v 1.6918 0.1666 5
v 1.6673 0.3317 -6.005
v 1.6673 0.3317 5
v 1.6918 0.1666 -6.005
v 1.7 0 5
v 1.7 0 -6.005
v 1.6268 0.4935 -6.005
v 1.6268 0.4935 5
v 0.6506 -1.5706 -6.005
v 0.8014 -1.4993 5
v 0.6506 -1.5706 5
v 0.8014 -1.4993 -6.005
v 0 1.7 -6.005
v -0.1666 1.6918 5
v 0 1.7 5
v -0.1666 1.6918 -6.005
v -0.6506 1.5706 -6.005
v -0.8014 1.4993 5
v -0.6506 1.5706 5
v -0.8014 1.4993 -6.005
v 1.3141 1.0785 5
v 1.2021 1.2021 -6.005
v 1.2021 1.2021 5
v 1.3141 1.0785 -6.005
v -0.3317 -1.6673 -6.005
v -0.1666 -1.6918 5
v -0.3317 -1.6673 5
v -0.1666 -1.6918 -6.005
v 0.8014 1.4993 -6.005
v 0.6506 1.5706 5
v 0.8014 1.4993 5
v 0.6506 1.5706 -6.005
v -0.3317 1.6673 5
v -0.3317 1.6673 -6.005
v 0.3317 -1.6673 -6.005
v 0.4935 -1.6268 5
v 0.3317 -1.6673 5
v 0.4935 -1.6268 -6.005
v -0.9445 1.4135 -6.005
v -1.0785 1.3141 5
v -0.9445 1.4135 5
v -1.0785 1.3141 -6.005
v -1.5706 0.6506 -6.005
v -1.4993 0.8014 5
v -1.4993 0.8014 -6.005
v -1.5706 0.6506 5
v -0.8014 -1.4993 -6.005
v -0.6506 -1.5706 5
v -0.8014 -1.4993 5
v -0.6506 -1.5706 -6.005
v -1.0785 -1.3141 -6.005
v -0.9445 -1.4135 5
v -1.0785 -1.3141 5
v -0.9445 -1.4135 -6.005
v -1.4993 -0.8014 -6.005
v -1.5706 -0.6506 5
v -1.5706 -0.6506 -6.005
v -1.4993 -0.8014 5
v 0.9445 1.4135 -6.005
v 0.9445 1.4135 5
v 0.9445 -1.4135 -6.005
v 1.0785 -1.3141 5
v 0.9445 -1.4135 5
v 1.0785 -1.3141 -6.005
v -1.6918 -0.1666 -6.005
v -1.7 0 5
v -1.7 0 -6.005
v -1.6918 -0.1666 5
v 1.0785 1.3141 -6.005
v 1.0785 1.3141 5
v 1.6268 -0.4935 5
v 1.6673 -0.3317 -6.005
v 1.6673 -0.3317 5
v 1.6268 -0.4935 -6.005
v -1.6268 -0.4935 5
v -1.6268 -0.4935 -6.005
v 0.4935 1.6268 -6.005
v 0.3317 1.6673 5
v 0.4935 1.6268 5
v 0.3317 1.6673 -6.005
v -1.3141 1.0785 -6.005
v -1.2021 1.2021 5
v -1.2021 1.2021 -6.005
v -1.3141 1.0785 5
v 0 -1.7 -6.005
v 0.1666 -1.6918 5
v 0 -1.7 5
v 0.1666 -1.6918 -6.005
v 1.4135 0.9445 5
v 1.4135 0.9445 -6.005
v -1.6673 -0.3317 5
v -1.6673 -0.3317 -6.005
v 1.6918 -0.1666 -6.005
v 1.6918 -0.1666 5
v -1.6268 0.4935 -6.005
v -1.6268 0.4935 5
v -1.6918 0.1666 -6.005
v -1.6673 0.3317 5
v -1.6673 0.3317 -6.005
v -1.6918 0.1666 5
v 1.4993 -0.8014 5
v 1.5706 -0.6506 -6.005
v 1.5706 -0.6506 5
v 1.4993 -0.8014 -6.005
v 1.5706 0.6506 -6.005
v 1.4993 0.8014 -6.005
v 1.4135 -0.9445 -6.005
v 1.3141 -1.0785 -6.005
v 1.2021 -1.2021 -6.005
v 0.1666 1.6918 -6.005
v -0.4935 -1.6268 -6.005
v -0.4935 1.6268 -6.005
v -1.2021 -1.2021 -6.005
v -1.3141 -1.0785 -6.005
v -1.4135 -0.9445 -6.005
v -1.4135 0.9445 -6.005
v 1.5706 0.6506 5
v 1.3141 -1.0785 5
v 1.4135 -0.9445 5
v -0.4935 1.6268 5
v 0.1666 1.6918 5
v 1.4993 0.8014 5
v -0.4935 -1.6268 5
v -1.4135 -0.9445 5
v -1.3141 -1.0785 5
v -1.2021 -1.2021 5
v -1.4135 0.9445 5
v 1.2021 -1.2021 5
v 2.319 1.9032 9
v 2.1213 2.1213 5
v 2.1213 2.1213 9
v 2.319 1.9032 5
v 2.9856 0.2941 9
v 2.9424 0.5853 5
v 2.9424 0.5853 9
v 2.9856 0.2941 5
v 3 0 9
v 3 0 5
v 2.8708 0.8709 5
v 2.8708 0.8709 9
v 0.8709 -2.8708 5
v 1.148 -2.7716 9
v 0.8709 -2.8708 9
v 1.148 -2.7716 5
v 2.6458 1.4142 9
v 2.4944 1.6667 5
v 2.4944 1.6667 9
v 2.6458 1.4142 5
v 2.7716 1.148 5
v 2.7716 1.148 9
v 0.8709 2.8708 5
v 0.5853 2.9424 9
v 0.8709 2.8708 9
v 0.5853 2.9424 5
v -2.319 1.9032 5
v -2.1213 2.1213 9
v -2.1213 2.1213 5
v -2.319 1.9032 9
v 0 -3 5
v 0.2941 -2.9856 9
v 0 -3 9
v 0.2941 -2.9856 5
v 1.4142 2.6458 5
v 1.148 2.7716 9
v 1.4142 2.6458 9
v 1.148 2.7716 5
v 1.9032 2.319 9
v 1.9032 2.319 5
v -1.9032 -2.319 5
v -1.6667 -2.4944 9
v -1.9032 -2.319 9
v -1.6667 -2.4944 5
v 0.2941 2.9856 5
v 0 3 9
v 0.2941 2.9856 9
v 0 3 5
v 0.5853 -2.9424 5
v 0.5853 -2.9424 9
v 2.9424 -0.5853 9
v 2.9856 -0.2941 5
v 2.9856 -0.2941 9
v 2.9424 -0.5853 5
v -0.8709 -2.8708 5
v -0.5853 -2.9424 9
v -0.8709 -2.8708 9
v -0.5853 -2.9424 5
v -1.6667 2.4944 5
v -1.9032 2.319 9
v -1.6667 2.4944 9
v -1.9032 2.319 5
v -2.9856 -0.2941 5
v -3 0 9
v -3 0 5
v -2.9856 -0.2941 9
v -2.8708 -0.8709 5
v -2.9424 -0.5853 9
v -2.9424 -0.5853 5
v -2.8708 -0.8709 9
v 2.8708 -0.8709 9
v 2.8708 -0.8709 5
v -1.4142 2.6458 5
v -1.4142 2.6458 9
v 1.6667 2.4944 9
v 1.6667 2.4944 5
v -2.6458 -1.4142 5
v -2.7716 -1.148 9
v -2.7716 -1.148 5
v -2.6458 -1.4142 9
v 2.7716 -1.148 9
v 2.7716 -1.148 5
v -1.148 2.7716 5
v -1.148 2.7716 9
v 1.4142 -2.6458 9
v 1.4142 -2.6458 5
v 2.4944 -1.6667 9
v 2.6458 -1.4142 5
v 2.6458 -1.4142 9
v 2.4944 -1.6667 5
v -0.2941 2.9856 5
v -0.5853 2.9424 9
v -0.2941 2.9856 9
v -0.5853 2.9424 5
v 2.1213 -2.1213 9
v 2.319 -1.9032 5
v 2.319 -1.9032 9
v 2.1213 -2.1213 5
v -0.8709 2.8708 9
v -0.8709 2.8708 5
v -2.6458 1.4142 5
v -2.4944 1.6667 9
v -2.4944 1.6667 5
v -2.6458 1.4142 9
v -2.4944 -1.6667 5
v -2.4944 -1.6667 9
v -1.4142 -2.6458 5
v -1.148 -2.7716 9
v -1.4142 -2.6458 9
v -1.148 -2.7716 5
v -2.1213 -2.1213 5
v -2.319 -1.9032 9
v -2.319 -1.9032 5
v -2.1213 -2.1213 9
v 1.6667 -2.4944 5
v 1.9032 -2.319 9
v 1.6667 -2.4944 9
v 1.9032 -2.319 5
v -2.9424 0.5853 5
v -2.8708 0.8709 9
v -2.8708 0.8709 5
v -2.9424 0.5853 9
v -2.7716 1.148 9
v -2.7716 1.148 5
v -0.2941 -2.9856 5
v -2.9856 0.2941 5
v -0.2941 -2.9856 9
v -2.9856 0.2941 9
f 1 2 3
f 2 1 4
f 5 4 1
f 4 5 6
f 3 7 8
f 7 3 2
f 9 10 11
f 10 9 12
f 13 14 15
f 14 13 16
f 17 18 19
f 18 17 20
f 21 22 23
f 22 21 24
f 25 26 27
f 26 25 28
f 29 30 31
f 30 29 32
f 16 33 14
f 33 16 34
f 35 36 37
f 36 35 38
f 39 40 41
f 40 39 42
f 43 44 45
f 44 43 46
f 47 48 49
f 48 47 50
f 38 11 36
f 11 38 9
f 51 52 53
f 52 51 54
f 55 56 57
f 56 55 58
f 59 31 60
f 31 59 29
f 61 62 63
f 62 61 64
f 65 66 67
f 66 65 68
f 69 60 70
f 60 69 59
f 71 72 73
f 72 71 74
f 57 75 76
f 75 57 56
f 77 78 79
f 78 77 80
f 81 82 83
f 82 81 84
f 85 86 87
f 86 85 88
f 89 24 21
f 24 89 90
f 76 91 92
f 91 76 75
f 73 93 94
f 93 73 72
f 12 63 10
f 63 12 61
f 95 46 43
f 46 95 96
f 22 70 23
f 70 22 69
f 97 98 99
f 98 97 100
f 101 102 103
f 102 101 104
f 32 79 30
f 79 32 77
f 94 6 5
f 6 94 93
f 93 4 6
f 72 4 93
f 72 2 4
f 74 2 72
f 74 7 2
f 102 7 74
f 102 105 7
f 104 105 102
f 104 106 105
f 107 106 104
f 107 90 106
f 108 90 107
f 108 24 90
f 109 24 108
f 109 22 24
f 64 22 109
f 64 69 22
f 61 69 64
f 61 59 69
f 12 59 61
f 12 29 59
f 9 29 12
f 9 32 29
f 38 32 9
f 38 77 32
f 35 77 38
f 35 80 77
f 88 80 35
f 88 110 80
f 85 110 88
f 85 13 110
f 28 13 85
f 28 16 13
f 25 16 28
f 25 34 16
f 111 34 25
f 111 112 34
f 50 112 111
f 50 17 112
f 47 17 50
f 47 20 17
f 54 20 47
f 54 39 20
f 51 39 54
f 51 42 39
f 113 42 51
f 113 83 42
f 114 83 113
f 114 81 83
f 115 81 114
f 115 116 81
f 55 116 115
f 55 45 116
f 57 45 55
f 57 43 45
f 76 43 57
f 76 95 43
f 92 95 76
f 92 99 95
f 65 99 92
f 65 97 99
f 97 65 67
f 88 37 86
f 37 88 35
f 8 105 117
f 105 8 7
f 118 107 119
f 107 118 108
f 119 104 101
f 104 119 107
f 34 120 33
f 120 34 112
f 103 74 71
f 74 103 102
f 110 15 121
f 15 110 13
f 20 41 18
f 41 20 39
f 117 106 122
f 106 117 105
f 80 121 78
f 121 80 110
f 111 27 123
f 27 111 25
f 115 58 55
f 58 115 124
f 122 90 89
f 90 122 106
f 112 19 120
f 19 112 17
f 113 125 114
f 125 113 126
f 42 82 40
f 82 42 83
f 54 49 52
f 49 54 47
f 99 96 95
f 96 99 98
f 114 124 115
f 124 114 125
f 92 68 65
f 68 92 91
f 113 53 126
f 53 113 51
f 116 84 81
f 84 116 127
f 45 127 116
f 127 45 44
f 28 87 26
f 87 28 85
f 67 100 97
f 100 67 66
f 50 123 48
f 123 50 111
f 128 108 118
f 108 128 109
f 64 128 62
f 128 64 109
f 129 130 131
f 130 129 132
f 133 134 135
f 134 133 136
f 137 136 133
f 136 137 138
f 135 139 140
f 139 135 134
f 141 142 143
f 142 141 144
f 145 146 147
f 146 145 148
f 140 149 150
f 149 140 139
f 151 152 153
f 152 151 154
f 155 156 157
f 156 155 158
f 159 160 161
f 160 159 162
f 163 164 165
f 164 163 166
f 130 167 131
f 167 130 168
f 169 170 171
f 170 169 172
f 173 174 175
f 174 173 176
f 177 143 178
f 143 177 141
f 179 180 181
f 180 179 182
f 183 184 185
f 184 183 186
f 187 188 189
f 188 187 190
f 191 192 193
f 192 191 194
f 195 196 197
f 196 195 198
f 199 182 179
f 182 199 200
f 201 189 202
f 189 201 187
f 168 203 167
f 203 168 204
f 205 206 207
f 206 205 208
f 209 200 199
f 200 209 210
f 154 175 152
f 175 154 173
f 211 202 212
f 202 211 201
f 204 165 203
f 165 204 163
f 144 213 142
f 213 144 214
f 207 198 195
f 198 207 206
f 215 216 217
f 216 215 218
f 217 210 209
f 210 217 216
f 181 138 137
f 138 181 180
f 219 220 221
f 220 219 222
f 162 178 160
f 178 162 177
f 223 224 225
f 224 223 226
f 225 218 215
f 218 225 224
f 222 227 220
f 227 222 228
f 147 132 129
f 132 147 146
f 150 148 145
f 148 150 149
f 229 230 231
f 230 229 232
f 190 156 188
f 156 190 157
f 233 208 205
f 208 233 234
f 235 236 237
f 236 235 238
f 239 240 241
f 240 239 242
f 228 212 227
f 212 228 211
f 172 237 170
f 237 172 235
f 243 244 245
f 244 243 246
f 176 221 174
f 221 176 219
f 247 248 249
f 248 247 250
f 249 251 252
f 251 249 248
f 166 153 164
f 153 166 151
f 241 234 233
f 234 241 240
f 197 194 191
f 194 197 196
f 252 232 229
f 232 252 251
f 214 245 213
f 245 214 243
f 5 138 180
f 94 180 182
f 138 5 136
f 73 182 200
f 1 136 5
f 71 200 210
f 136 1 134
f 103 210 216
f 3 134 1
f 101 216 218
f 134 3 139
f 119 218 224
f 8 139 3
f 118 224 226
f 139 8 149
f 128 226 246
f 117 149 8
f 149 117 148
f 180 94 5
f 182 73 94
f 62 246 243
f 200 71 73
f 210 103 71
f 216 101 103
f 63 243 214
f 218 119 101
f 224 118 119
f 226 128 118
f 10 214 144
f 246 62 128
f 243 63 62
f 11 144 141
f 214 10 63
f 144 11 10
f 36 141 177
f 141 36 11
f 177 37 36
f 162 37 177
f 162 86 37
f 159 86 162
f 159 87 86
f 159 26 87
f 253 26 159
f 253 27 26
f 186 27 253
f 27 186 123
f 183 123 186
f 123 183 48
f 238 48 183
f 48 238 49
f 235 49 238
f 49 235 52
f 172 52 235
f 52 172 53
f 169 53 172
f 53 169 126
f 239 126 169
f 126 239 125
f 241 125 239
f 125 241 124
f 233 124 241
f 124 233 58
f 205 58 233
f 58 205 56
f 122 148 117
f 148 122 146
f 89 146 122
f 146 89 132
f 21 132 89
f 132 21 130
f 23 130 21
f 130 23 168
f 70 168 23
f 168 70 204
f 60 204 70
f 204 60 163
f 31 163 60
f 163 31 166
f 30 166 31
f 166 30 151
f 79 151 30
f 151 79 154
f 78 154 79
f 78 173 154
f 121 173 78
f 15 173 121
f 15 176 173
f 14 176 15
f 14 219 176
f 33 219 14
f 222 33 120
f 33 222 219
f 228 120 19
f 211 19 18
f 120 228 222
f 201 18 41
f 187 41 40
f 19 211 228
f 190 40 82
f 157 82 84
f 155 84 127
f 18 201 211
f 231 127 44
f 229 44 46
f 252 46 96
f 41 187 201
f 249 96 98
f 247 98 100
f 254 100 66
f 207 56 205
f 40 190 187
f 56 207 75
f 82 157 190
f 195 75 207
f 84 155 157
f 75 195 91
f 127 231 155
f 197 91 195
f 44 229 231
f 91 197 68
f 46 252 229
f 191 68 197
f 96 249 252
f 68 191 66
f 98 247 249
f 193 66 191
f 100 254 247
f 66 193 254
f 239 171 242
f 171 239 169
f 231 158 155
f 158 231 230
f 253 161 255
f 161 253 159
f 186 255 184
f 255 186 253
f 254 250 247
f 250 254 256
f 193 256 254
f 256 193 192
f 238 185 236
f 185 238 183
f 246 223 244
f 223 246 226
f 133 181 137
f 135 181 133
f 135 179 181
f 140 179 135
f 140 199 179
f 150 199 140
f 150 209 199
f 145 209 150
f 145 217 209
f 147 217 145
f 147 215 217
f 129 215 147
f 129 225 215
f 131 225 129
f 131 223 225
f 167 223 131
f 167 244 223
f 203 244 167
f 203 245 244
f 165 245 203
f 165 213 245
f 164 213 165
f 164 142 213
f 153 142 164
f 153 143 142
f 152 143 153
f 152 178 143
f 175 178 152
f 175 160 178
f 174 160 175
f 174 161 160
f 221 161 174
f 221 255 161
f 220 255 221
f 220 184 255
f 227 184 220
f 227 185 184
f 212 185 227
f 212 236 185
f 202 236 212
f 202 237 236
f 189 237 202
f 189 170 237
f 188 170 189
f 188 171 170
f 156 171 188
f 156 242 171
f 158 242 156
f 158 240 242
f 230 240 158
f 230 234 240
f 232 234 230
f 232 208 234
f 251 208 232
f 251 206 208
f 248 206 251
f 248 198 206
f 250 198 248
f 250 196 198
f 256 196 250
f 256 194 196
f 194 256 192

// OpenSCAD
//-- General parts
//-- Ariel Burman
//-- Moorman Lab, University of Massachusetts Amherst
//-- v1.2 - April 2021

// screw to do differences
module screwM3(length,show=false){
  translate([0,0,-length-.005])cylinder(h=length+.1+.005,d=3.4,$fn=64);
  cylinder(h=4,d=6,$fn=64);
  if (show==true) {
    %translate([0,0,-length])cylinder(h=length,d=3.2,$fn=64);
    %cylinder(h=3,d=5.5,$fn=64);
    echo(str("M3 screw lenght: ", length, " mm"));
  }
}

// nut to do differences
module nutM3(rotation=0,show=false) {
  rotate([0,0,rotation])cylinder(h=2.6+.01,d=6.5,$fn=6,center=true);
  if (show==true) {
    %difference(){
      rotate([0,0,rotation])cylinder(h=2.6,d=6.4,$fn=6,center=true);
      cylinder(h=3,d=3.5,$fn=64,center=true);
    }
  }
}

module torus(d1,d2,fn=64){
  //d1: thickness of the torus
  //d2: middle diameter
  // external diameter = d2 + d1/2
  // internal diameter = d2 - d1/2
  
  assert (d1<=d2, str("ERROR d1 must not be greater than d2. d1 = ",d1,"| d2 = ",d2));
  rotate_extrude(convexity = 10,$fn=fn)
  translate([d2/2, 0, 0])
  circle(d=d1, $fn=fn);
}


module rrect(size,center=false,fn=64){

  dx = size[0];
  dy = size[1];
  dz = size[2];

  if (center==true)
    _rrect(size,fn);
  else
    translate([dx/2,dy/2,dz/2]) _rrect(size,fn);

  module _rrect(size,fn){
    d = min(dx,dy);
    a = (d == dx ? 0 : 1);
    
    hull()
      for(i=[-1,1]) 
        translate([a*i*(dx-d)/2,(1-a)*i*(dy-d)/2,0])
             cylinder(h=dz,d=d,$fn=fn,center=true);
  }

}  

module r2cube(size,center=false,r=0,fn=64){

  dx = size[0];
  dy = size[1];
  dz = size[2];

  assert(r>0,"Corner radius must be grater than 0 (otherwise just use cube)");
  assert(r<=min(dx,dy)/2,"Corner radius must not be greater than min(x,y)/2");

  if (center==true)
    _r2cube(size,r,fn);
  else
    translate([dx/2,dy/2,dz/2]) _r2cube(size,r,fn);
  
  module _r2cube(size,r,fn){
    
    hull()
      for(i=[-1,1]) 
        translate([i*(dx/2-r),0,0])
          rrect([2*r,dy,dz],fn=fn,center=true);

  }

}

module rcylinder2(h,r=0,d=0,center=false,fn=64){

  module _rcylinder2(h,d,fn){
      //cylinder(h=h-d,d=d,center=true,$fn=128);
      hull()
      for(i=[-1,1])translate([0,0,i*(-h/2+d/2)])rotate([0,90,0])sphere(d=d,$fn=64);
  }
  
  assert (r!=0 || d!=0);
  if (d==0) {
    assert (h>2*r,"h should be greater than 2*r");
    if (center==true)
      _rcylinder2(h,2*r,fn);
    else
      translate([0,0,h/2])_rcylinder2(h,2*r,fn);
  }
  else {
    if (r>0) echo("'rcylinder': when provinding 'd', 'r' is ignored");
    assert (h>d,"h should be greater than d");
    if (center==true)
      _rcylinder2(h,d,fn);
    else
      translate([0,0,h/2])_rcylinder2(h,d,fn);
  }
}


module rcylinder(h,r,rb,center=false,fn=64){
  module _rcylinder(h,r,rb,fn){
    hull(){
      translate([0,0,-h/2+rb/2])torus(rb,2*r-rb,fn);
      translate([0,0,h/2-rb/2])torus(rb,2*r-rb,fn);
    }
  }
  if (center==true)
    _rcylinder(h,r,rb,fn);
  else
    translate([0,0,h/2])_rcylinder(h,r,rb,fn);
}

module rhcylinder(h,rout,rin,rb,center=false,fn=64){
  //rounded hollow cylinder
  module _rhcylinder(h,rout,rin,rb,fn){
    difference(){
      union(){
      cylinder(h=h,d=2*rout-rb,$fn=fn,center=true);
      cylinder(h=h-rb,d=2*rout,$fn=fn,center=true);
      }
      cylinder(h=h-rb,d=2*rin,$fn=fn,center=true);
      translate([0,0,h/2])cylinder(h=rb+.1,d=2*rin+rb,$fn=fn,center=true);
      translate([0,0,-h/2])cylinder(h=rb+.1,d=2*rin+rb,$fn=fn,center=true);
    }
    translate([0,0,-h/2+rb/2])torus(rb,2*rout-rb,fn);
    translate([0,0,h/2-rb/2])torus(rb,2*rout-rb,fn);
    translate([0,0,-h/2+rb/2])torus(rb,2*rin+rb,fn);
    translate([0,0,h/2-rb/2])torus(rb,2*rin+rb,fn);
  }
  
  //do assertions
  assert(rout>rin);
  assert(rb<=(rout-rin));
  assert(h>=rb);

  if (center==true)
    _rhcylinder(h,rout,rin,rb,fn);
  else
    translate([0,0,h/2])_rhcylinder(h,rout,rin,rb,fn);
}

module r3cube(size,center=true,rc=0,rb=0,fn=32){
  
  
  module _r3cube(size,r,fn){
//    hull(){
//      for(i=[-1,1]) 
//        for(j=[-1,1])
//          for(k=[-1,1])
//          translate([i*(dx/2-r),j*(dy/2-r),k*(dz/2-r)]) sphere(r=r,$fn=32);
//    }

     hull(){
      for(k=[-1,1]) translate([0,0,k*(dz/2-r)])
        hull(){
          for(j=[-1,1])translate([0,j*(dy/2-r),0])
            hull(){
              for(i=[-1,1])
                translate([i*(dx/2-r),0,0]) sphere(r=r,$fn=fn);
            }
        }
     }

  }

  module _r3cube(size,r,fn){
//    hull(){
//      for(i=[-1,1]) 
//        for(j=[-1,1])
//          for(k=[-1,1])
//          translate([i*(dx/2-r),j*(dy/2-r),k*(dz/2-r)]) sphere(r=r,$fn=32);
//    }

     hull(){
      for(k=[-1,1]) translate([0,0,k*(dz/2-r)])
        hull(){
          for(j=[-1,1])translate([0,j*(dy/2-r),0])
            hull(){
              for(i=[-1,1])
                translate([i*(dx/2-r),0,0]) sphere(r=r,$fn=fn);
            }
        }
     }

  }
  

  
  dx = size[0];
  dy = size[1];
  dz = size[2];
  assert (rc>0,"Missing radius value rc");
  if (rb==0){
    //same radius for all corners and edges;
    assert (rc<=min(dx,dy,dz)/2,"Corner radius must not be greater than min(x,y,z)/2");
    
    if (center==true)
      _r3cube(size,rc,fn);
    else
      translate([dx/2,dy/2,dz/2]);
  }
  else {
  //assert (rb>0,"Missing radius value rb");
    assert (rc<=min(dx,dy)/2,"Corner radius must not be greater than min(x,y)/2");
    assert (rb<dz/2,"Border radius must not be greater than z/2");

    if (center==true)
      _r3bcube(size,rc,fn);
    else
      translate([dx/2,dy/2,dz/2]);
  }
}



difference(){
  cube(12,center=true);
  !translate([0,0,5])screwM3(11,show=true);
  translate([0,0,-4.7])nutM3(rotation=0,show=true);
}
//translate([10,10,0])
*torus(1,20-1,64);

*rrect([10,5,2],center=false,fn=1024);
*r2cube([15,21,2],r=3,fn=64,center=false);
*r3cube([20,15,5],rc=2);
*rcylinder(h=10,r=10,rb=4,center=false,fn=64);
*rcylinder(h=10,r=2,rb=2,center=false,fn=64);
*rcylinder2(h=10,d=3,r=2,center=true,fn=64);
*rhcylinder(h=15,rout=14,rin=8,rb=2,center=true,fn=128);
